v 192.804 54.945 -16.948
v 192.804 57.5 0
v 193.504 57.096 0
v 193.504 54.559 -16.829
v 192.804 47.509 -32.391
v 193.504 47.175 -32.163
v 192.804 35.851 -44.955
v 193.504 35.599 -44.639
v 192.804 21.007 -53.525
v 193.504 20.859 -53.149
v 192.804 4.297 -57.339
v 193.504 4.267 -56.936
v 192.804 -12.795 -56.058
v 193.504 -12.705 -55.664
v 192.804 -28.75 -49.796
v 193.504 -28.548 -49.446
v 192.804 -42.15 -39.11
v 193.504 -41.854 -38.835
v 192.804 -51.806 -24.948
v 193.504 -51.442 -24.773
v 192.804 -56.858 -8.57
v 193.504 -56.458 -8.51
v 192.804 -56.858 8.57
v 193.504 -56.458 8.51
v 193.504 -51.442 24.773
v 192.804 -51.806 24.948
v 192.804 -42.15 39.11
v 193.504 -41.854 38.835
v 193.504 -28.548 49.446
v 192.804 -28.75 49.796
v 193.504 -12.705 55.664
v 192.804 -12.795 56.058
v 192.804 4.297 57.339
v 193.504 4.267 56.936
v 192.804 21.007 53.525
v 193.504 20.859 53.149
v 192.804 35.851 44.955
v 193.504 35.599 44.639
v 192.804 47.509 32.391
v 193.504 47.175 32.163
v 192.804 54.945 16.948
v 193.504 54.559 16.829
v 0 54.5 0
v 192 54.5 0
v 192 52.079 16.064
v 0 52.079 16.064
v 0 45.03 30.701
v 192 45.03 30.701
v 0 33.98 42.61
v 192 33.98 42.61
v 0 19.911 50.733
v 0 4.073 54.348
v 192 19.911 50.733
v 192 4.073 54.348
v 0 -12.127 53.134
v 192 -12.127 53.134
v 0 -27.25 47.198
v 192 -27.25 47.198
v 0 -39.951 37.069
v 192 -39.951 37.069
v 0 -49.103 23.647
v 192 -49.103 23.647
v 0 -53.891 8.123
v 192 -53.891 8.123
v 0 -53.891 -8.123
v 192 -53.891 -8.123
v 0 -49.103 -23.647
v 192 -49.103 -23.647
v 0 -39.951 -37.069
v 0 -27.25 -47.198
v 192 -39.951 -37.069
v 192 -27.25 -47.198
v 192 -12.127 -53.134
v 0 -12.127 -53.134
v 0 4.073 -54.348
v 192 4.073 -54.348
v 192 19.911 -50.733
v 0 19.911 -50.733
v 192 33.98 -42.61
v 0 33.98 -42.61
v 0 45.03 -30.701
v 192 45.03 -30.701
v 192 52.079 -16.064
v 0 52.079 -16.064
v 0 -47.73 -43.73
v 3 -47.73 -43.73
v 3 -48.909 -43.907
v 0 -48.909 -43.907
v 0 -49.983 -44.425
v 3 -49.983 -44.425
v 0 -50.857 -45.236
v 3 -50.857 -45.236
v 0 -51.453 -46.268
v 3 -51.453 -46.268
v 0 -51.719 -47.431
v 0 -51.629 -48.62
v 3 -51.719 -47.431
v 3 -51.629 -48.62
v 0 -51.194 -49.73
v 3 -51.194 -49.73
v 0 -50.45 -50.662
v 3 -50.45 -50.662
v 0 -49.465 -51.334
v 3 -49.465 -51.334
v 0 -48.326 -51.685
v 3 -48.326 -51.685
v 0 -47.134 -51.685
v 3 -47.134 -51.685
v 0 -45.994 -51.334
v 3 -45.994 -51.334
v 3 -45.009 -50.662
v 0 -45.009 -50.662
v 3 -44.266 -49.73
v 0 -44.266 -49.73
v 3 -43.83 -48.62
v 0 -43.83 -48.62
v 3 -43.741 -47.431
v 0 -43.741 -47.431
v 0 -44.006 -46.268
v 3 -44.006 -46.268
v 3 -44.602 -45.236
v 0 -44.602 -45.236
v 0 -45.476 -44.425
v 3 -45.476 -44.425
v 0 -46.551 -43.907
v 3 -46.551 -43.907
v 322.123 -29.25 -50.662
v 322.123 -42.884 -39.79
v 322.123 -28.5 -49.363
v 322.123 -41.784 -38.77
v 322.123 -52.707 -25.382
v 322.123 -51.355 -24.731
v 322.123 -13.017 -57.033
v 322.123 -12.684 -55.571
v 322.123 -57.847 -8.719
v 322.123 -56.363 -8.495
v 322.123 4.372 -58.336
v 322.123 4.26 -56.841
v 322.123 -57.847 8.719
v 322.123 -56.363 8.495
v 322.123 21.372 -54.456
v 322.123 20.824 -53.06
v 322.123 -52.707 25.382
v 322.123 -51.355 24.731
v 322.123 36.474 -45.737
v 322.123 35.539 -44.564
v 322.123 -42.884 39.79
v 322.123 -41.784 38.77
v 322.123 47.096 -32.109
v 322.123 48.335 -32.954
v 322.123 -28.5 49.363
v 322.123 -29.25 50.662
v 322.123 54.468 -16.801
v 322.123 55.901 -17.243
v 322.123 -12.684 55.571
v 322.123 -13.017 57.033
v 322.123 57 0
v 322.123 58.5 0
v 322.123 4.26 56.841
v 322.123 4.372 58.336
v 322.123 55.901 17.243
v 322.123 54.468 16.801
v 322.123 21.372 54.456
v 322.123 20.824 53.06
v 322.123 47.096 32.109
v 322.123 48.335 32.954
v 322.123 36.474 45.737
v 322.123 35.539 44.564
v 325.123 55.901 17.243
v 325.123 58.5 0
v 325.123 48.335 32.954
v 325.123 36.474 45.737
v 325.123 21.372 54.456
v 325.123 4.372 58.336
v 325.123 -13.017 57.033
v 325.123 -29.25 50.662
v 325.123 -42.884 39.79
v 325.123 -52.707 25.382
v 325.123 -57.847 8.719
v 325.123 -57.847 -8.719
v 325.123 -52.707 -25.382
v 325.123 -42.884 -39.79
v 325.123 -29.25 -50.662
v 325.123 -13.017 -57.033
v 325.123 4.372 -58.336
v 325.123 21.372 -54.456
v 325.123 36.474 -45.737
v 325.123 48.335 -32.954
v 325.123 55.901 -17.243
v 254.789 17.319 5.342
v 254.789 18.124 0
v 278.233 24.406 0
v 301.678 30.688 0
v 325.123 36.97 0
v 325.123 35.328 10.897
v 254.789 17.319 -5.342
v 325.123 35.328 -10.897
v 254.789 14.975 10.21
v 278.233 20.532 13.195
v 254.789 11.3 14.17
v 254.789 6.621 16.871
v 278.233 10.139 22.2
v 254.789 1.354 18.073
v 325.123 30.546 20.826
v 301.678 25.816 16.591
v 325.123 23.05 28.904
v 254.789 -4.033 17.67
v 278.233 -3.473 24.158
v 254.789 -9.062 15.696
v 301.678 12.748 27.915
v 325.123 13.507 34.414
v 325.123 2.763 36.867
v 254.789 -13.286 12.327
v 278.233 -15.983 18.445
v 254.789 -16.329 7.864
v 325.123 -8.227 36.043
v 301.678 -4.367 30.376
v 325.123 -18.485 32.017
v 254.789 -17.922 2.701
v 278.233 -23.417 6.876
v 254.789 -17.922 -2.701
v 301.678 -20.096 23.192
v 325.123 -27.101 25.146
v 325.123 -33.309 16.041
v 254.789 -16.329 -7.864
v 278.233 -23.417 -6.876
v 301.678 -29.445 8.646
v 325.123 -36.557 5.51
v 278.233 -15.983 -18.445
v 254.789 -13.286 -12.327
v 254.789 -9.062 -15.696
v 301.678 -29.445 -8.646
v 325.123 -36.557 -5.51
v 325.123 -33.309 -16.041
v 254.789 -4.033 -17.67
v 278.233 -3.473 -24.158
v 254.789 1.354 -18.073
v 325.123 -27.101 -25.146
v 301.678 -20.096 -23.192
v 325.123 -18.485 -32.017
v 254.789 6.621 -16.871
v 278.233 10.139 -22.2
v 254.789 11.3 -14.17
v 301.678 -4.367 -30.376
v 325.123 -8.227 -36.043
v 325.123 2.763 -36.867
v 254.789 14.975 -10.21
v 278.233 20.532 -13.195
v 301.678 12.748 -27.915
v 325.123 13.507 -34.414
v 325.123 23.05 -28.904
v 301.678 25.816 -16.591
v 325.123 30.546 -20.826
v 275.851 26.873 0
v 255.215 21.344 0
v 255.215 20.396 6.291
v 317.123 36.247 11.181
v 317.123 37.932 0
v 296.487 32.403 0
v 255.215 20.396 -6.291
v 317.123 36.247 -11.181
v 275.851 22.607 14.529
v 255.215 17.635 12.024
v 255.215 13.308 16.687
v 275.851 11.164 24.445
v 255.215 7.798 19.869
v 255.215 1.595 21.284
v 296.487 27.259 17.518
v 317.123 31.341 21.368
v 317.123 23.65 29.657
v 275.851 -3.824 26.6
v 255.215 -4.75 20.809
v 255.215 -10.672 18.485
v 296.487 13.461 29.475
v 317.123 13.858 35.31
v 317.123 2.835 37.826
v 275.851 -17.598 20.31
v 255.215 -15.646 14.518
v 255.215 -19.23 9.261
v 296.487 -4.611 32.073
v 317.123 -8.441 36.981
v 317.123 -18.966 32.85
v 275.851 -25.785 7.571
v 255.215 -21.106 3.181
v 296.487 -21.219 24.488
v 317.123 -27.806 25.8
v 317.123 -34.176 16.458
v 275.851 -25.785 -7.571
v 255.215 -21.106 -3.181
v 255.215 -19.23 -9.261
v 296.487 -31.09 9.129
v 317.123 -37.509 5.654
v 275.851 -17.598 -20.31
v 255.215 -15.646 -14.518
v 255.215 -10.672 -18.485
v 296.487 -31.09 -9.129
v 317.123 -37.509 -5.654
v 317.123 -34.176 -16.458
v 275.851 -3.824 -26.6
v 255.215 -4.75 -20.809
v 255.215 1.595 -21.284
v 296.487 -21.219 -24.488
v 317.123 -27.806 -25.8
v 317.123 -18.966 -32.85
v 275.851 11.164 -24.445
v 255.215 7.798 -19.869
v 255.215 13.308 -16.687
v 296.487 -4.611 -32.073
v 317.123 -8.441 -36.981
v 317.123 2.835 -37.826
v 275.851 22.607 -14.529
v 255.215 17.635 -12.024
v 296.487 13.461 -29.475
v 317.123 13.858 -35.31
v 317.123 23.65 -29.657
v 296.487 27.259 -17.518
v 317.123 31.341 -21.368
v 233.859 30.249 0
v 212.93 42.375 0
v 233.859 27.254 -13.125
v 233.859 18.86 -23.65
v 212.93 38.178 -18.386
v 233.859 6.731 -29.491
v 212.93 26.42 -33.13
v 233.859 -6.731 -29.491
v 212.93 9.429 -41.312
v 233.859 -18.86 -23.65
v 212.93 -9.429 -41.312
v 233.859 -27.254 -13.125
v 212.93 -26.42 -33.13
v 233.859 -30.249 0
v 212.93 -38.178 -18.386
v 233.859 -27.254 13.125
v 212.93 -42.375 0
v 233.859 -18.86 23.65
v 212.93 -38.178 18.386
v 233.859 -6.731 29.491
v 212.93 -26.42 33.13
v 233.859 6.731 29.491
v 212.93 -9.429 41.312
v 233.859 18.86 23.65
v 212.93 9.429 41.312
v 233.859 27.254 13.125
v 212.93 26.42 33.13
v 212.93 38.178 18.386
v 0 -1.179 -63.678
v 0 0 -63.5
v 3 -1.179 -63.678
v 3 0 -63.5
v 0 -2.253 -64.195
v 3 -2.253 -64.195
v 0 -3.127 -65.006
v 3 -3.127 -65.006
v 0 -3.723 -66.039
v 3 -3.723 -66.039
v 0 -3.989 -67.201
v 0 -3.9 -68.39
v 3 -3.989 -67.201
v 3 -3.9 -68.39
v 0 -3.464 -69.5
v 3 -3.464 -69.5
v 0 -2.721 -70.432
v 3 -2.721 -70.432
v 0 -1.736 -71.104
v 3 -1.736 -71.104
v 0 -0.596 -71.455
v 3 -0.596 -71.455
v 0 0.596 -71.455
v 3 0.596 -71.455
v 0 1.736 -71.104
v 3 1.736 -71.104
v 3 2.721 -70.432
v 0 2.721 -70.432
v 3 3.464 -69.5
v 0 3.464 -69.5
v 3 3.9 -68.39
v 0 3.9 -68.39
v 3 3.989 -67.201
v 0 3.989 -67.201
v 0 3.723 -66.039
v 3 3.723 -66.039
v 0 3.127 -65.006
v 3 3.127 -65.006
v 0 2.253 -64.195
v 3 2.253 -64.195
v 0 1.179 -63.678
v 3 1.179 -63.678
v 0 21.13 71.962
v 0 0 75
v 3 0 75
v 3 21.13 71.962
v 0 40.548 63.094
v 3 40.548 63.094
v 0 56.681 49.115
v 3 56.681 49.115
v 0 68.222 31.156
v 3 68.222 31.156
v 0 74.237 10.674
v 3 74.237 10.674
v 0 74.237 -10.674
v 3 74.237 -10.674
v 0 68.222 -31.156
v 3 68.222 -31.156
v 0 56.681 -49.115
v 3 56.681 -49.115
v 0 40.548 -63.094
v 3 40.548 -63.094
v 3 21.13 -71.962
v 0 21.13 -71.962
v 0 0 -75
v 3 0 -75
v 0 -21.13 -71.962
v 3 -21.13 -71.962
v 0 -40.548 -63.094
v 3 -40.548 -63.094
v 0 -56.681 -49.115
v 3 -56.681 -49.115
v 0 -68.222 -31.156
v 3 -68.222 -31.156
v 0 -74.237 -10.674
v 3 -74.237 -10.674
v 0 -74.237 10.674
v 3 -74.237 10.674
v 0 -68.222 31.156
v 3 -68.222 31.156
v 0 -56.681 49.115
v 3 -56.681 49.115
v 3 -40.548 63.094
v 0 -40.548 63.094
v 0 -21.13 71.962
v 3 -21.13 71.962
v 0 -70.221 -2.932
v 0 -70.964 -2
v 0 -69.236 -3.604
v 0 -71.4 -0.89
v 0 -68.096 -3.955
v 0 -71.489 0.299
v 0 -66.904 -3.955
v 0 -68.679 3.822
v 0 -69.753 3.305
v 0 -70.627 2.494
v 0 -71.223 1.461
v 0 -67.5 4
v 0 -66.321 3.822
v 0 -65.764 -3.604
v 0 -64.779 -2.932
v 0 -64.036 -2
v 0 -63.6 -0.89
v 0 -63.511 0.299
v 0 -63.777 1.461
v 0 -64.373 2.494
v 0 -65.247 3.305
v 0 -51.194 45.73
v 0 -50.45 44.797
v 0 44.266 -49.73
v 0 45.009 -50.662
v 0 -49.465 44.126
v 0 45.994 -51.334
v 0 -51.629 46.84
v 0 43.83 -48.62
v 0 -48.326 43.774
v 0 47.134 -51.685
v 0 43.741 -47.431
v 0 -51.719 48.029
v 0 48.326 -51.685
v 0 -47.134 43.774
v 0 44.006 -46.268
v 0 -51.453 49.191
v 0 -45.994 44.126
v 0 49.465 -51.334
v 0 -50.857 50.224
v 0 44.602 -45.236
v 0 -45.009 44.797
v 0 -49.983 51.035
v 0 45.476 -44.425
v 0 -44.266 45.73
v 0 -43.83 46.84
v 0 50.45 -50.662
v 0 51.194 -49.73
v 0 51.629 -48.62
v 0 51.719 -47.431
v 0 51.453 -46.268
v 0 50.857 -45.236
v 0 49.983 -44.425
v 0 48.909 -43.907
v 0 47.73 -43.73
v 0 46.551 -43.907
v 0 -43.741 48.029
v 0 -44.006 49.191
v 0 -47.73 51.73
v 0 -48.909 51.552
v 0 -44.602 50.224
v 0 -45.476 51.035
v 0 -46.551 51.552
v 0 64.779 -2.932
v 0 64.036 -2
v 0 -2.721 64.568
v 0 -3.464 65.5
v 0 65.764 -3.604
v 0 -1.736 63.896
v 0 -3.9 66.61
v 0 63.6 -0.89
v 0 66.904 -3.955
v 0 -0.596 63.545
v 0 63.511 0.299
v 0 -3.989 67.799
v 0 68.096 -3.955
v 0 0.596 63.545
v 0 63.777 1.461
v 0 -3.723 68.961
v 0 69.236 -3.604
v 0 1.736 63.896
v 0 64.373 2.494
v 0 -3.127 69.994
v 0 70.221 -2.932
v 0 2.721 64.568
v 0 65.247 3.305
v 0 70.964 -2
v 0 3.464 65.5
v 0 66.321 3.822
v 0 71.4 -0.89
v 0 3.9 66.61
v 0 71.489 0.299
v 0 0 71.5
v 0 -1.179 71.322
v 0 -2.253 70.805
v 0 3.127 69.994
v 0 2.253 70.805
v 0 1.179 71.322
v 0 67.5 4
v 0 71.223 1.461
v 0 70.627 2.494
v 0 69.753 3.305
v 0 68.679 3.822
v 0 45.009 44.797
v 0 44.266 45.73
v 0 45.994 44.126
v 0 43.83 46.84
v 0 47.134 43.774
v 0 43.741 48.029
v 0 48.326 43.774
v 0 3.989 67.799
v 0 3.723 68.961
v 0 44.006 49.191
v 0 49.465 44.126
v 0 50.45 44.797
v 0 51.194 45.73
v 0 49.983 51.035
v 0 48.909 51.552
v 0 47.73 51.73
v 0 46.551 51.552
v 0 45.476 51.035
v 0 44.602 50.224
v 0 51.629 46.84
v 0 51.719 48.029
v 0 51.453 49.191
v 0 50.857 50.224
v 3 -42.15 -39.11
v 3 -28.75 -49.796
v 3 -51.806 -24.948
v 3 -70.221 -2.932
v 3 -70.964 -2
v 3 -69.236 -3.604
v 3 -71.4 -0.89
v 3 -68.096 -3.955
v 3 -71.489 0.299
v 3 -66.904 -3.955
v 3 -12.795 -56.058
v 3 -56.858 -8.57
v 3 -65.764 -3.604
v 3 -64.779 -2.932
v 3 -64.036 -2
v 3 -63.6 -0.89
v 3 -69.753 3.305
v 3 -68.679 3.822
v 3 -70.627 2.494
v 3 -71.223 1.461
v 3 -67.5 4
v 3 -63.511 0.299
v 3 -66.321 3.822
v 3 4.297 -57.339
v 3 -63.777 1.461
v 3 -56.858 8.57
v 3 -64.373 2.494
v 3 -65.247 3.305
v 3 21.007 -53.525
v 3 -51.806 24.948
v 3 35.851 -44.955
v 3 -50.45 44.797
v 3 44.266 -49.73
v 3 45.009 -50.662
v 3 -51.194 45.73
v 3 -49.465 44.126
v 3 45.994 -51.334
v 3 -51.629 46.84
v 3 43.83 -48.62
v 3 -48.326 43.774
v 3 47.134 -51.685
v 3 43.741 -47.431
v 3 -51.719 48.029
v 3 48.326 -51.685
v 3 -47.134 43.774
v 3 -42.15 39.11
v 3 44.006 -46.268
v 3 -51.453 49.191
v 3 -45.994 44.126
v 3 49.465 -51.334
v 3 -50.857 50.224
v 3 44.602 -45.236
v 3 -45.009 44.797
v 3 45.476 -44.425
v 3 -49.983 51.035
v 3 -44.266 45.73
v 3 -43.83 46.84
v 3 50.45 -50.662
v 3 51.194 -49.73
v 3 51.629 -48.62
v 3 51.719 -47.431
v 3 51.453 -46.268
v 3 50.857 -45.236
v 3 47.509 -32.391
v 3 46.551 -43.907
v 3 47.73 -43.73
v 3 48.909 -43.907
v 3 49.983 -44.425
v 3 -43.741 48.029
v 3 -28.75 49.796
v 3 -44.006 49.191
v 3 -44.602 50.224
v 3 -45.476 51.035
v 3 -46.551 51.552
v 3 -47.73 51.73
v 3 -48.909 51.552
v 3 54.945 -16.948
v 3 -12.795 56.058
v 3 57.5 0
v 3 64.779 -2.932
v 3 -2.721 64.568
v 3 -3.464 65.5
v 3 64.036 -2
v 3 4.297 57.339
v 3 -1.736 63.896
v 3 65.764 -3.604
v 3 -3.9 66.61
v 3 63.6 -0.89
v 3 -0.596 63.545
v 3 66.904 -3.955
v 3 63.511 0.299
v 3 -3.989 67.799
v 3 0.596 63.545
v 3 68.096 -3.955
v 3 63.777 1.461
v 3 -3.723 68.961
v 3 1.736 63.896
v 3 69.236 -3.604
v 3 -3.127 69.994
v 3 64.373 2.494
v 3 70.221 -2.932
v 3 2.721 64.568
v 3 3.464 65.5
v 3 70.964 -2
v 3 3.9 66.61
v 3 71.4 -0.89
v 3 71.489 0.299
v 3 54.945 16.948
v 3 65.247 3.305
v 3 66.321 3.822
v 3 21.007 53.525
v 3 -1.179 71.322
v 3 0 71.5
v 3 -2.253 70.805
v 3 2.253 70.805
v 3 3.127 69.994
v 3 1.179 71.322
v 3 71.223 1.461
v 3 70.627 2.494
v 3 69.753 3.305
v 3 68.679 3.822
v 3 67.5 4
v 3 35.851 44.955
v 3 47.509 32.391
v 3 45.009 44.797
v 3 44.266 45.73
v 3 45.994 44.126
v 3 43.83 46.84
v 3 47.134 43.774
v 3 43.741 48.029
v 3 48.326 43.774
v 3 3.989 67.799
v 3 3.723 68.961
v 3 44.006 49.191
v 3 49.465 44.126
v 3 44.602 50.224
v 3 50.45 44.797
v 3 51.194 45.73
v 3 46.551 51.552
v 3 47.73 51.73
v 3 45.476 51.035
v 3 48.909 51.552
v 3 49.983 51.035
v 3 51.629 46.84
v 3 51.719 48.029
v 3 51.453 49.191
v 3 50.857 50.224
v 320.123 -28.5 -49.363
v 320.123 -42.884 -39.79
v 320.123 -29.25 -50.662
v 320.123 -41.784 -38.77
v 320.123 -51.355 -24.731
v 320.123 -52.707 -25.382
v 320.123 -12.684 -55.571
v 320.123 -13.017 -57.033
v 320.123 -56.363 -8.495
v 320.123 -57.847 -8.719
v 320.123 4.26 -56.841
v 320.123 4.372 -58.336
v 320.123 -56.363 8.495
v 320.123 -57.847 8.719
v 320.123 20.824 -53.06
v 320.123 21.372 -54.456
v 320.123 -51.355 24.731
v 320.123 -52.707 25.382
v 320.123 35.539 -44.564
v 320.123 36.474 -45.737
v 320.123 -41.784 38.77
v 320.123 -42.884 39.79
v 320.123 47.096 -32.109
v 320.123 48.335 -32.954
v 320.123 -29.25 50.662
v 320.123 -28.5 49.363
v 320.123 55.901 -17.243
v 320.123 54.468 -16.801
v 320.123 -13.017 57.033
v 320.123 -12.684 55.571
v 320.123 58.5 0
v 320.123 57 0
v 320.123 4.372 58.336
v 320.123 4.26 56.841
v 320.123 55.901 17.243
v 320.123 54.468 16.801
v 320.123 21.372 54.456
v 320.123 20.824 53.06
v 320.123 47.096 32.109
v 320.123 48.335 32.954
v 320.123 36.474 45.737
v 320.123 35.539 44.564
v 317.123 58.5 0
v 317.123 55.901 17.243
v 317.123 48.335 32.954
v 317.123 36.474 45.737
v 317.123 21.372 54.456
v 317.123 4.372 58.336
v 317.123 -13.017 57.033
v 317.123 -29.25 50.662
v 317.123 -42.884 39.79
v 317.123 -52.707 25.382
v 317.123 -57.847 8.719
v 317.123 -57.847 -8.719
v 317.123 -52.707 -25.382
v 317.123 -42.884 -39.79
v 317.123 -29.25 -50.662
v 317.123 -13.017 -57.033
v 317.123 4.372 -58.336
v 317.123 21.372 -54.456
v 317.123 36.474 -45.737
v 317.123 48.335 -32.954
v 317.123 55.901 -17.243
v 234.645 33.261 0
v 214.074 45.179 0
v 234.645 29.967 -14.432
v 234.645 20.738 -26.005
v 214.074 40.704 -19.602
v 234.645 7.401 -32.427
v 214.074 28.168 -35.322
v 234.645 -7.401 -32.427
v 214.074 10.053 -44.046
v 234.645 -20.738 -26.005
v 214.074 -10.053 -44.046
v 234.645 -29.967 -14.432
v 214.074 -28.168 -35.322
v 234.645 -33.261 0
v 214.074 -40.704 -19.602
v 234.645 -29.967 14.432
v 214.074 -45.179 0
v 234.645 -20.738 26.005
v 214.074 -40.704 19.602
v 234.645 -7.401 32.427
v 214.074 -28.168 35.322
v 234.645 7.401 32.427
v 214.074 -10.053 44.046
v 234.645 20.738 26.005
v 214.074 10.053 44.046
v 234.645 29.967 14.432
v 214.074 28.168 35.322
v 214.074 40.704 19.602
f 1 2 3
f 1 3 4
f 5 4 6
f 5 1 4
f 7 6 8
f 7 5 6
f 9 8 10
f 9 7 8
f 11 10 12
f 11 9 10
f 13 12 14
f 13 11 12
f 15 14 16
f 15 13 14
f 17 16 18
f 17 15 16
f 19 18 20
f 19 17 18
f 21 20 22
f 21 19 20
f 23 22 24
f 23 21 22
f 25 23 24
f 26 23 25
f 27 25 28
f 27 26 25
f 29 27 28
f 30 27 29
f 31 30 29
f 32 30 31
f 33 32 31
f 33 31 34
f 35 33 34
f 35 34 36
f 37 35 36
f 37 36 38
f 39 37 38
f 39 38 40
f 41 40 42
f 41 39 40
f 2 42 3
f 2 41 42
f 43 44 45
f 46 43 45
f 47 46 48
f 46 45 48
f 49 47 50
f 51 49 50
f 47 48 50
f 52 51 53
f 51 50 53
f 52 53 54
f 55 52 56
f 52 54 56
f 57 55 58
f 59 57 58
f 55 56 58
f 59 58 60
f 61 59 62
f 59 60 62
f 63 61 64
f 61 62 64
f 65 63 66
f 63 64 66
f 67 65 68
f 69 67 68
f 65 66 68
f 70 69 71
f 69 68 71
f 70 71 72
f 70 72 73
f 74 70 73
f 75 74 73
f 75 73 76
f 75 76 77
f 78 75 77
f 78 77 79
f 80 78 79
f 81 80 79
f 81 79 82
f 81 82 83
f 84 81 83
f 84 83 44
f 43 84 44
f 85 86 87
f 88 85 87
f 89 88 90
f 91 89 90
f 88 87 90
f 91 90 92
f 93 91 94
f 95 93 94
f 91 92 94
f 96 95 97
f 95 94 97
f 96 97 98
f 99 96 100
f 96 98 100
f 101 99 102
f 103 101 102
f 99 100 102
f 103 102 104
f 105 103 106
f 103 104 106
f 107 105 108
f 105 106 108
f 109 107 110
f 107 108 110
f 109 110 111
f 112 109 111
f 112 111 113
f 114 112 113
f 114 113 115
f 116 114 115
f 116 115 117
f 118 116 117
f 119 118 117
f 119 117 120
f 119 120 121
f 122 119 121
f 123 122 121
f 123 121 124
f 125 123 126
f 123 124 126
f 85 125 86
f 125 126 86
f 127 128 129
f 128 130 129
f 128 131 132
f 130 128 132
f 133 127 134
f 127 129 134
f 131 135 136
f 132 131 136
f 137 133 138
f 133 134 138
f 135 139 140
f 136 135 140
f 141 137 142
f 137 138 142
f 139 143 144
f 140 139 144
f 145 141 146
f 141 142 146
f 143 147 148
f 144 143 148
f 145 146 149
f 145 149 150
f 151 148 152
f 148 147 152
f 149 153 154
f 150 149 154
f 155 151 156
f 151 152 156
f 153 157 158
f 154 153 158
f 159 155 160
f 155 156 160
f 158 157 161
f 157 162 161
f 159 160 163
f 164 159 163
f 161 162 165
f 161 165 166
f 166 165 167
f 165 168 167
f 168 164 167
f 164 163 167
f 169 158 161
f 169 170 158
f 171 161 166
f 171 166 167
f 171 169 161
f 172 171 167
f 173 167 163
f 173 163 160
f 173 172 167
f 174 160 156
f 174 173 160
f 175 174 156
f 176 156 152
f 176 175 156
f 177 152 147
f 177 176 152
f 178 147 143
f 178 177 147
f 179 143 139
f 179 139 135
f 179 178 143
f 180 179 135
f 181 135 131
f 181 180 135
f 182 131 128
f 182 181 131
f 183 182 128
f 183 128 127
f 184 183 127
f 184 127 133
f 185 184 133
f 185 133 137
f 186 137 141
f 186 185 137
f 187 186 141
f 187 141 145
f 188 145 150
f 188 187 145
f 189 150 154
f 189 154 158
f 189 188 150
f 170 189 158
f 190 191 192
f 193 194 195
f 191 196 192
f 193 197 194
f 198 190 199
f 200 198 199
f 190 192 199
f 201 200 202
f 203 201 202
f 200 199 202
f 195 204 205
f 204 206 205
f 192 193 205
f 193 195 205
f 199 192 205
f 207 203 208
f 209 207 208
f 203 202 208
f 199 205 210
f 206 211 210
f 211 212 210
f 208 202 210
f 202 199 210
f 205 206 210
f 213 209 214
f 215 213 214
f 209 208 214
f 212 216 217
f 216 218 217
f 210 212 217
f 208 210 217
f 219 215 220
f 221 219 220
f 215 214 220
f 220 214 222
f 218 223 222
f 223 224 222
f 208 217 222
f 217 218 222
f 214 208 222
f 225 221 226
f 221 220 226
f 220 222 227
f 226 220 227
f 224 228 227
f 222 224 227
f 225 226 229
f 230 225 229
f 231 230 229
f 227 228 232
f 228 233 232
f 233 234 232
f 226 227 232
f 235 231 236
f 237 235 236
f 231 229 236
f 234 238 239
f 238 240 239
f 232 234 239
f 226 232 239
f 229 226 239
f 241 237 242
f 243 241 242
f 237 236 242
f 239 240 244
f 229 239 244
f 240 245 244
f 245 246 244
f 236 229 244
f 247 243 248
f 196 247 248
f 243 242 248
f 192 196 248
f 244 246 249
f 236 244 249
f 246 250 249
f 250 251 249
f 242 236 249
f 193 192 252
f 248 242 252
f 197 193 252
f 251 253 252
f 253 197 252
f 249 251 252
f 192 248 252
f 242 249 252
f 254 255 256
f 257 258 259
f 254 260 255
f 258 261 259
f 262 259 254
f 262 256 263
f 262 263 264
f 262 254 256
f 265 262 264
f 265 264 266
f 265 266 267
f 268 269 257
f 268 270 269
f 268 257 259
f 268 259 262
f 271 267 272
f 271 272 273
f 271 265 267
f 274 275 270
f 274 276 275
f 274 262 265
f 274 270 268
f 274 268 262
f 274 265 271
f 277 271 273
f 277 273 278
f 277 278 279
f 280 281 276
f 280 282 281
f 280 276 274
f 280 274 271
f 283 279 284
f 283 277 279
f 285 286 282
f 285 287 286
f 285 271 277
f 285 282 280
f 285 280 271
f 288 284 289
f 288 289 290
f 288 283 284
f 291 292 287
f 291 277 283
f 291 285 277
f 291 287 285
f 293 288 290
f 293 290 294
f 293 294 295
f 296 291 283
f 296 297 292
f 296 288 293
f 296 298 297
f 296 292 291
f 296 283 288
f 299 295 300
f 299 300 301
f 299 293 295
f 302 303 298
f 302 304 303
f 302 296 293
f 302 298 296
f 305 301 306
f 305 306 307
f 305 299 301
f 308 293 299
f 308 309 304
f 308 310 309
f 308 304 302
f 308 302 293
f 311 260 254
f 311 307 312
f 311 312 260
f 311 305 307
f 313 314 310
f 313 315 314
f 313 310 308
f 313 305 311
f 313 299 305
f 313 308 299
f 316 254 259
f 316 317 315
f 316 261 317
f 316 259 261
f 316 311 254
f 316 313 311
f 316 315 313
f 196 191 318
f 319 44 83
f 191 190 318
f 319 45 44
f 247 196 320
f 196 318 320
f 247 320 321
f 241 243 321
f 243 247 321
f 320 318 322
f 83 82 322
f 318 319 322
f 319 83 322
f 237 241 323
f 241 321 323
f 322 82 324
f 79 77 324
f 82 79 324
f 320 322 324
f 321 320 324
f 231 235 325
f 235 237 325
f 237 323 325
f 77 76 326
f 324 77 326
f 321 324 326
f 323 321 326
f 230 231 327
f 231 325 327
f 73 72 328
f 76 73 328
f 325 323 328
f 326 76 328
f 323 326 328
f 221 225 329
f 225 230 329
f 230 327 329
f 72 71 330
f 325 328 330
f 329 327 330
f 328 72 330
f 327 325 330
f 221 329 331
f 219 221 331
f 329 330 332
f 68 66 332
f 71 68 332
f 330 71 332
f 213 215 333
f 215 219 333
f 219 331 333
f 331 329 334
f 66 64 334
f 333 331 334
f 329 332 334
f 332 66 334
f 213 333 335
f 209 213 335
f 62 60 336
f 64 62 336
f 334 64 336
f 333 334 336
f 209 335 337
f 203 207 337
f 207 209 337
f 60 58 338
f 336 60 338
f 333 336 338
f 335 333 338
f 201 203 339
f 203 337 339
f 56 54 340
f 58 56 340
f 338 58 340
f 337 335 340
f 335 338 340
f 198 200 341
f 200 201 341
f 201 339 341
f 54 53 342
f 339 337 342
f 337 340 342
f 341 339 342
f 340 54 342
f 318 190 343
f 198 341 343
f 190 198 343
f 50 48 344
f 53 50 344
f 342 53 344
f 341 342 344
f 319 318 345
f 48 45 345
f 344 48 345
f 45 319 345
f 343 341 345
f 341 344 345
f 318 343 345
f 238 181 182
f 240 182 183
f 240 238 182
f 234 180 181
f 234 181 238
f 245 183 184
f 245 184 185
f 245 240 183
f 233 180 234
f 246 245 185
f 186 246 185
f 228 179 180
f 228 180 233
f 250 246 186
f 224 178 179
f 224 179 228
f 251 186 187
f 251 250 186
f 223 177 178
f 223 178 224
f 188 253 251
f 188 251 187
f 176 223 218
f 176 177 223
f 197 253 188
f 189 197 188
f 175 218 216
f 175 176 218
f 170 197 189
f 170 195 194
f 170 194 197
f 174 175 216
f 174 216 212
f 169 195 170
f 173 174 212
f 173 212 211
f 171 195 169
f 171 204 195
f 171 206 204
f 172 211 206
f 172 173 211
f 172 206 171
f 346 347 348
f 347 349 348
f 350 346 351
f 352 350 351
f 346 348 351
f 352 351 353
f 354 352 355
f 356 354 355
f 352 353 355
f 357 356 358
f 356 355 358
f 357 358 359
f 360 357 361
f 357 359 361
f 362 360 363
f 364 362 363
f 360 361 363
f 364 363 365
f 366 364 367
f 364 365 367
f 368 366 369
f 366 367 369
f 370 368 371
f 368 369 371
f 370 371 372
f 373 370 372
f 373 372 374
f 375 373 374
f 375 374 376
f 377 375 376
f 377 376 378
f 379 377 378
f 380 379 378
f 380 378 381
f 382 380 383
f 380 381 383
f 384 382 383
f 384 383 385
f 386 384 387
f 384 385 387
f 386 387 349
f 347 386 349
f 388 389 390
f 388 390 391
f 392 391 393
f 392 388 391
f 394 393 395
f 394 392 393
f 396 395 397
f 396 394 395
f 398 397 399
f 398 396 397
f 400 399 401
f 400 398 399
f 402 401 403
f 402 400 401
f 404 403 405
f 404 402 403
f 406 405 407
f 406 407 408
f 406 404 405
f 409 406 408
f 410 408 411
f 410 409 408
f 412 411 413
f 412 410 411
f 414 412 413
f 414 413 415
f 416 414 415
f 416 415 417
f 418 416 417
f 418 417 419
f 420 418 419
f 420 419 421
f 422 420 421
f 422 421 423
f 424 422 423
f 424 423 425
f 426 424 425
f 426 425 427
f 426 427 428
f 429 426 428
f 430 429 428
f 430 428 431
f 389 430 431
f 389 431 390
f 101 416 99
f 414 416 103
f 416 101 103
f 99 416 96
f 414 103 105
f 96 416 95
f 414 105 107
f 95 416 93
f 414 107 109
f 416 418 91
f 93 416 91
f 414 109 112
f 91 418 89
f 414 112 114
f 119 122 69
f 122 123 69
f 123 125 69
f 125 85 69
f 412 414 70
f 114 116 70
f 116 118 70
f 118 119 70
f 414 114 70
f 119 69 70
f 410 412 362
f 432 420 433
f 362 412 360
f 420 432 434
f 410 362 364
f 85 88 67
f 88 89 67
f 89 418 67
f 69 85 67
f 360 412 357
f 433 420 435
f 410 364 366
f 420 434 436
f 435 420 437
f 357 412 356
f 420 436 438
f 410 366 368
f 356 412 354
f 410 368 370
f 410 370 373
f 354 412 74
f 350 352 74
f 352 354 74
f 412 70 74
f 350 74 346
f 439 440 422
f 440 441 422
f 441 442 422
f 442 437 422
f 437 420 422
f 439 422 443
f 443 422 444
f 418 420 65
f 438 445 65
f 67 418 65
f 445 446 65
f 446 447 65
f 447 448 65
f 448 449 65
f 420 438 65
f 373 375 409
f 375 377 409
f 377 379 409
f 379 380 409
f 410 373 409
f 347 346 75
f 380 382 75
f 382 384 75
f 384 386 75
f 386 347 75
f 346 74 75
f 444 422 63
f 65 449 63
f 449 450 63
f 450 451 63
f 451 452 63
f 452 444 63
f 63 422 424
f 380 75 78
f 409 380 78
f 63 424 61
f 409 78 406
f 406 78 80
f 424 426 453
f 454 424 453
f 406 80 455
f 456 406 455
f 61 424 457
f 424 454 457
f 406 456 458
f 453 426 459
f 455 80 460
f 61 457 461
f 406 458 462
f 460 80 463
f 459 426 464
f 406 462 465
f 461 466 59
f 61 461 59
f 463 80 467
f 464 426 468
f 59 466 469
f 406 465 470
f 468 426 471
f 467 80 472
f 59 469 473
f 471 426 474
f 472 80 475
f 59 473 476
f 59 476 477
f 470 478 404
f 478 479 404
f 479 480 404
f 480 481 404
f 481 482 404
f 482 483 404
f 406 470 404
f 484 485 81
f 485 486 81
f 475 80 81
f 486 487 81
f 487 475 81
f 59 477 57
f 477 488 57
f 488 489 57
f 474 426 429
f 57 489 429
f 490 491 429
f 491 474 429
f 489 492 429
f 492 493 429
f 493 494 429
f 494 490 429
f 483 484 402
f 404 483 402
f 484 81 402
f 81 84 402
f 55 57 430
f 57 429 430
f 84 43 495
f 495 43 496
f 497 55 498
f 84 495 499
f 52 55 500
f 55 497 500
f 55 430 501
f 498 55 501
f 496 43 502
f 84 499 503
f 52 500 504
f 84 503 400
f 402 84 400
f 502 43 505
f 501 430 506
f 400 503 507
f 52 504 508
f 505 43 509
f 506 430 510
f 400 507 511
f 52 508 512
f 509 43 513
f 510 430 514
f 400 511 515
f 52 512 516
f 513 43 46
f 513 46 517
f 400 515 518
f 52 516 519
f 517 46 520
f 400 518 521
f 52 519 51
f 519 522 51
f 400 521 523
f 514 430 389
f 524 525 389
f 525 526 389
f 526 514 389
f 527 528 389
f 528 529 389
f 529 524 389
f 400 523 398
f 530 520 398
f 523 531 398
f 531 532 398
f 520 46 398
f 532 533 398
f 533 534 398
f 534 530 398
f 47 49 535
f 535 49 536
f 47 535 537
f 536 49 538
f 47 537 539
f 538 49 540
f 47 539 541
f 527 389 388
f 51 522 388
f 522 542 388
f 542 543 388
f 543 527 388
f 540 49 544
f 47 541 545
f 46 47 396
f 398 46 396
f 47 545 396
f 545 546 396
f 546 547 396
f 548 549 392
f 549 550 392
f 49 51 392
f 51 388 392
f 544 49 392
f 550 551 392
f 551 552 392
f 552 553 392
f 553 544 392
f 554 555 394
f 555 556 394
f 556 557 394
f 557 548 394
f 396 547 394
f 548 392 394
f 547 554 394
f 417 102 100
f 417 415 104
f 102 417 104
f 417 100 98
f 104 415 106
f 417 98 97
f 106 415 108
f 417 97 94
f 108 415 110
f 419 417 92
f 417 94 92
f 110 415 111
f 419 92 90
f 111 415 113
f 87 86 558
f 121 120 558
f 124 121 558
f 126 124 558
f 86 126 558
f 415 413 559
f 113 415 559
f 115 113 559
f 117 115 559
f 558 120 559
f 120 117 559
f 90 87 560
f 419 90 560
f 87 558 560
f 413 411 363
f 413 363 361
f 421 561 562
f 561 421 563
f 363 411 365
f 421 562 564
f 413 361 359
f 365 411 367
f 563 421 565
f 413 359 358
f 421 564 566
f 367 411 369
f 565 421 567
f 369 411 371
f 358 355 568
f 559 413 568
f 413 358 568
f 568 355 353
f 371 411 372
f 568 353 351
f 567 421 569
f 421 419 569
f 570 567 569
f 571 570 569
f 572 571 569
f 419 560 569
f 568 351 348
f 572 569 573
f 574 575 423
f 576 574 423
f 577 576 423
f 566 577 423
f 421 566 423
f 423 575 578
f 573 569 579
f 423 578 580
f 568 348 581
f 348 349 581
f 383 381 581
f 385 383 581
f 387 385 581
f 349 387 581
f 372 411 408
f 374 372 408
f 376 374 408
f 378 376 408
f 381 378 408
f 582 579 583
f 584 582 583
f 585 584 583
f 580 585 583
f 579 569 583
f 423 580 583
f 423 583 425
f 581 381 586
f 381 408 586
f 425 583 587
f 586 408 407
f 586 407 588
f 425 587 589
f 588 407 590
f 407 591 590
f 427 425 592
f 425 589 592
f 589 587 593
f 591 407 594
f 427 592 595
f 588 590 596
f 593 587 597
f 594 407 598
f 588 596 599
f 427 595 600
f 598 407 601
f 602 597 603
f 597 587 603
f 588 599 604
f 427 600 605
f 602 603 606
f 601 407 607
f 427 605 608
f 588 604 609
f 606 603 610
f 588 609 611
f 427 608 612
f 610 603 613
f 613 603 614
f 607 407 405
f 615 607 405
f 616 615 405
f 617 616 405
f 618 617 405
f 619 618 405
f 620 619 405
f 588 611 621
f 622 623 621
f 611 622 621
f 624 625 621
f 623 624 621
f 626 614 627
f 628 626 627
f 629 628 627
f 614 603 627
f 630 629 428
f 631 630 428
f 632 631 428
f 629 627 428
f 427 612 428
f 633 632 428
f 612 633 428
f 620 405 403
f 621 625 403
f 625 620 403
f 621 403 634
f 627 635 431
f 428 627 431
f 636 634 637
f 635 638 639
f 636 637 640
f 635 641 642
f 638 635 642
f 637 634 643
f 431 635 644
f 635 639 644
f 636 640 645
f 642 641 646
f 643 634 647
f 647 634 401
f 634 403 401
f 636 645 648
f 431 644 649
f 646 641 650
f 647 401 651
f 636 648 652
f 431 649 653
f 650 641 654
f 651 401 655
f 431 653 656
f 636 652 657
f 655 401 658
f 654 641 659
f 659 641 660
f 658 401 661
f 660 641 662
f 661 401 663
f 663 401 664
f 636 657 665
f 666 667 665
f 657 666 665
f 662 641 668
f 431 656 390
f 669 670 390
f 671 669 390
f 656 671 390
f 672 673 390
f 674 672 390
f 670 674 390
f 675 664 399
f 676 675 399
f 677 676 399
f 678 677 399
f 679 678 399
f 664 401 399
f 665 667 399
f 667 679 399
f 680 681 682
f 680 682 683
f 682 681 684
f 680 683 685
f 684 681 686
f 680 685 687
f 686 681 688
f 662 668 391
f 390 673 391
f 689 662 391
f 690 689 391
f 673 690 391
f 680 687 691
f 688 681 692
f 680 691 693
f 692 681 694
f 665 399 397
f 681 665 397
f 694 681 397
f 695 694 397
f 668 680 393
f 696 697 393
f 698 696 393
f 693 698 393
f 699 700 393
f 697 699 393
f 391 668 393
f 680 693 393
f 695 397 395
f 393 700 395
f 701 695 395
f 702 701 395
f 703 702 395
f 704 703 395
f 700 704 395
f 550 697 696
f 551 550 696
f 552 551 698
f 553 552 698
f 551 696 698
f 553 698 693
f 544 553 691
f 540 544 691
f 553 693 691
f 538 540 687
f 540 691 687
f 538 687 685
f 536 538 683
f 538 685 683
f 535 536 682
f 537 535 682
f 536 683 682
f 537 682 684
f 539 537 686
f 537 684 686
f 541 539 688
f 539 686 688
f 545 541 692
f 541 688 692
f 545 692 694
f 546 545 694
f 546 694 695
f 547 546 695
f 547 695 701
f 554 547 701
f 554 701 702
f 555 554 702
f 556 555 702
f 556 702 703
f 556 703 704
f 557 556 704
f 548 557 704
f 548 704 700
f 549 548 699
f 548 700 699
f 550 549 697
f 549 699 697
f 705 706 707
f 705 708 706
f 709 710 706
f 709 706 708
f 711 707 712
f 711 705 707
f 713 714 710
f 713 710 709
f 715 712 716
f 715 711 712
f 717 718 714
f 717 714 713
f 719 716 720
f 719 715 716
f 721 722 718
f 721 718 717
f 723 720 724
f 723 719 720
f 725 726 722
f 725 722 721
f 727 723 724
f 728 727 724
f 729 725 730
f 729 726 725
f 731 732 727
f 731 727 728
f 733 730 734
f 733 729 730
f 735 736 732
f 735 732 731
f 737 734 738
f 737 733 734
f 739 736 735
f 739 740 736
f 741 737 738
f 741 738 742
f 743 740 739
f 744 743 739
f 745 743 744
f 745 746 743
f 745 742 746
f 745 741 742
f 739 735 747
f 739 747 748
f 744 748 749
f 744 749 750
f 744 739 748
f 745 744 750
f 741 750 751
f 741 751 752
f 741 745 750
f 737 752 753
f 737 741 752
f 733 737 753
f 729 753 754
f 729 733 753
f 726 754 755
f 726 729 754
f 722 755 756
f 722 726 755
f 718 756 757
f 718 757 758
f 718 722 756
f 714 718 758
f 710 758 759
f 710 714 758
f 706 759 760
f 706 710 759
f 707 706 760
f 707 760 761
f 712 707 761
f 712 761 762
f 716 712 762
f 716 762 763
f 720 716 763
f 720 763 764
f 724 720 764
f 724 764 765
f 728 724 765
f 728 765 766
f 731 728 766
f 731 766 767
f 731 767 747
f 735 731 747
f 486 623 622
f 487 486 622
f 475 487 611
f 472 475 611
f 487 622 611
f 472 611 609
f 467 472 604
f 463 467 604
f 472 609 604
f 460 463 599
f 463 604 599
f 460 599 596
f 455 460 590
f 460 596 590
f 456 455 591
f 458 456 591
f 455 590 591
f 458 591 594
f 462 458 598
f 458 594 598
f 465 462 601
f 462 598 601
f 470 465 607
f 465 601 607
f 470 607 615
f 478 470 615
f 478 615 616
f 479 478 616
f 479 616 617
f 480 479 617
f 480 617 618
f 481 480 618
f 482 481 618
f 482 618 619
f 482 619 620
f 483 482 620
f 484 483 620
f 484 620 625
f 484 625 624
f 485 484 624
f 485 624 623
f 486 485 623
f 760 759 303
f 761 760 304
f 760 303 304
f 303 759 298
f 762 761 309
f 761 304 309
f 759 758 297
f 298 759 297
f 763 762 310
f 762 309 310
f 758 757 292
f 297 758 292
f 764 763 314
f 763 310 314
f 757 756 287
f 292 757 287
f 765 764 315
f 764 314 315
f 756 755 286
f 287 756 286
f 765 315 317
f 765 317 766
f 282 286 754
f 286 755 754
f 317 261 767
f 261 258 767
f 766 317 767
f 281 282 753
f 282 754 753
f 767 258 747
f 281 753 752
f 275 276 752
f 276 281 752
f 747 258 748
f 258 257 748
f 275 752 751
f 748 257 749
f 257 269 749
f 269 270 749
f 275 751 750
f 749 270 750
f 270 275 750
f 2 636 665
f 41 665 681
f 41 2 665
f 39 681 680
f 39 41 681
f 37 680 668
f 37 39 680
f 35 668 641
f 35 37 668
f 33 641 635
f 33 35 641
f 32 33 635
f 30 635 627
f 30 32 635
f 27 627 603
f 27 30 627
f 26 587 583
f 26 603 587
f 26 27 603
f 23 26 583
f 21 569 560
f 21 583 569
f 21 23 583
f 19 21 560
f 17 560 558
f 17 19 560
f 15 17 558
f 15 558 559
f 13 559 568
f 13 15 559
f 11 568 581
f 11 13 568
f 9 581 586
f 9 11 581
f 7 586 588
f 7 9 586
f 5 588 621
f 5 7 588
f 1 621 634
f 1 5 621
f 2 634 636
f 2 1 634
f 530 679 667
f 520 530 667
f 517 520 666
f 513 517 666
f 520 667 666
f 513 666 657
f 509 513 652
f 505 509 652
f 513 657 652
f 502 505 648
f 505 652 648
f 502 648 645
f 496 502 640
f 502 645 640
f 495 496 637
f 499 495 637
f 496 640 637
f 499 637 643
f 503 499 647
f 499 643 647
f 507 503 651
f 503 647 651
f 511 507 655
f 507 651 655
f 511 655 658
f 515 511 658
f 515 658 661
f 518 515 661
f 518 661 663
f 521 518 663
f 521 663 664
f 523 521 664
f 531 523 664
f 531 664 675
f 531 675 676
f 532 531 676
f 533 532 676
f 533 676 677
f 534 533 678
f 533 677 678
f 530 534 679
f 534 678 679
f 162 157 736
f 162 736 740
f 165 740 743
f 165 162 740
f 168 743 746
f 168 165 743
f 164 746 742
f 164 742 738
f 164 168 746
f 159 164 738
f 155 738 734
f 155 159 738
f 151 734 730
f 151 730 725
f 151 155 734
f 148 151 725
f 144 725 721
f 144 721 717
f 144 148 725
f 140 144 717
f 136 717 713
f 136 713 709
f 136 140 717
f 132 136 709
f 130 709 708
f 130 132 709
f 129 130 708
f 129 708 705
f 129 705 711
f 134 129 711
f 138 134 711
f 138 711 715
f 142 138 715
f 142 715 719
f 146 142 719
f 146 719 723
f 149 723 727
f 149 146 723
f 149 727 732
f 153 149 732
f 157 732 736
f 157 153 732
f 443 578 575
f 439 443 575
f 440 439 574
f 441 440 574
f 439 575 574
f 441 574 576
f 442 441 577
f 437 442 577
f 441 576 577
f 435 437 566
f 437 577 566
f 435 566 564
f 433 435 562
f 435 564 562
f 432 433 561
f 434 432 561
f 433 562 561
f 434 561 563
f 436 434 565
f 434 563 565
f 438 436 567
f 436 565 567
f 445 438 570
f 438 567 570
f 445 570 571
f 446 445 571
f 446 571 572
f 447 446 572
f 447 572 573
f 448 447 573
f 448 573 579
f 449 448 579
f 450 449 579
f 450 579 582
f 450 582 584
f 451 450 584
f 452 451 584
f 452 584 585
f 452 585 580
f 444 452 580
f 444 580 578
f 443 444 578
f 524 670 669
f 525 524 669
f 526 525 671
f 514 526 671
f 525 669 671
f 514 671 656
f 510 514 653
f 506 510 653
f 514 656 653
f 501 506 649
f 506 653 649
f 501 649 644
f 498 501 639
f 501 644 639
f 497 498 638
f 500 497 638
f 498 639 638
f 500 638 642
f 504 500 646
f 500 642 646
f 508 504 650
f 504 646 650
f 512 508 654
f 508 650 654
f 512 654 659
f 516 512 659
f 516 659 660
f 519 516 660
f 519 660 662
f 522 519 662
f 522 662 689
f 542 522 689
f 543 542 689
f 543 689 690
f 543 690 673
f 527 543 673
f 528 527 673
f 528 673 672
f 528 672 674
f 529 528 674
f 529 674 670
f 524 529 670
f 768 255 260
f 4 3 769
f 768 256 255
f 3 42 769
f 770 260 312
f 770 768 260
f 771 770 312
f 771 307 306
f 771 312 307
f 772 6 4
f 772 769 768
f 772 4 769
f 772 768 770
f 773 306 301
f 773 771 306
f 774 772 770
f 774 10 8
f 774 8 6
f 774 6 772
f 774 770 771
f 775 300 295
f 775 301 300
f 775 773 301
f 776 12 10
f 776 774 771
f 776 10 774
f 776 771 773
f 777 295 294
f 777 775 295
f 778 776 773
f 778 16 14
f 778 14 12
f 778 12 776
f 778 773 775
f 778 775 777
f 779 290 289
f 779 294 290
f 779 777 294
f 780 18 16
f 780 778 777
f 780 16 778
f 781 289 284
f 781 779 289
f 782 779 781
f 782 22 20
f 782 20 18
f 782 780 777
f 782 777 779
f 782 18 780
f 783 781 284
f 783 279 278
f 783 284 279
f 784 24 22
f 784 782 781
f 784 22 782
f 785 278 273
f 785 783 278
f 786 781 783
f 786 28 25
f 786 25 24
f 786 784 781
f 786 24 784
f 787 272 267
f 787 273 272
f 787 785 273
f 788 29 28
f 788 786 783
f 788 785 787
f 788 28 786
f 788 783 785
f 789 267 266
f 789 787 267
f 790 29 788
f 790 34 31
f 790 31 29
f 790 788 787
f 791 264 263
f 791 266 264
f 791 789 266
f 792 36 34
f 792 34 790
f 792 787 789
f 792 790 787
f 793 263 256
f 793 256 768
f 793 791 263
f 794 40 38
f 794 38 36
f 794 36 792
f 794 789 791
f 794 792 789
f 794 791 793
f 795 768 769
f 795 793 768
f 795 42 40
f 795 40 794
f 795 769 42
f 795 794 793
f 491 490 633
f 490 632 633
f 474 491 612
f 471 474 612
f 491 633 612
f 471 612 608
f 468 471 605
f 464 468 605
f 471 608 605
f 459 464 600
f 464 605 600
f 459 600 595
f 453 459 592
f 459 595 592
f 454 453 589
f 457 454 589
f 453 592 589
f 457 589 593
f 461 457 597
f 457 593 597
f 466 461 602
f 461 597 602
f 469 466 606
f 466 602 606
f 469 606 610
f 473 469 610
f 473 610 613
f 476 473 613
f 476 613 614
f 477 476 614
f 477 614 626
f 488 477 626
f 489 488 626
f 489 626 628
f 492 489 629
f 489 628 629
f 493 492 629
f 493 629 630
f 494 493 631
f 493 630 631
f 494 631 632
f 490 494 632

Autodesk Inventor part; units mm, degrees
ref_plane "YZ Plane" through (0, 0, 0) normal (1, 0, 0) x (0, 1, 0)
ref_plane "XZ Plane" through (0, 0, 0) normal (0, 1, 0) x (-1, 0, 0)
ref_plane "XY Plane" through (0, 0, 0) normal (0, 0, 1) x (1, 0, 0)
sketch "Sketch2" plane through (0, 0, 0) normal (0, 0, 1) x (1, 0, 0)
  line L0 (0, 54.5) -> (192, 54.5)
  line L1 (254.7886, 18.124) -> (254.7886, 0) construction
  line L2 (192, 54.5) -> (254.7886, 18.124)
  line L3 (254.7886, 18.124) -> (325.1228, 36.97)
  line L4 (254.7886, 18.124) -> (254.7886, 43.3259) construction
  line L5 (0, 0) -> (254.7886, 0)
  line L6 (325.1228, 36.97) -> (325.1228, 0)
  line L7 (192, 54.5) -> (254.7886, 18.124)
  line L8 (325.1228, 0) -> (305.1228, 0)
  line L9 (-65.0246, 0) -> (390.1474, 0) projected
  line L10 (0, 57.5) -> (192, 57.5)
  line L11 (193.5039, 57.0958) -> (255.2149, 21.3441)
  line L12 (255.2149, 21.3441) -> (325.1228, 40.0758)
  line L13 (325.1228, 36.97) -> (325.1228, 40.0758)
  line L14 (0, 54.5) -> (0, 57.5)
  line L15 (193.5039, 57.0958) -> (192.8038, 57.5)
  line L16 (193.5039, 57.0958) -> (200.0085, 57.0958) construction
  line L17 (192, 57.5) -> (192.8038, 57.5)
  line L18 (325.1228, 40.0758) -> (325.1228, 57.5)
  line L19 (317.1228, 57.5) -> (317.1228, 37.9322)
  line L20 (325.1228, 0) -> (325.1228, 58.5)
  line L21 (317.1228, 58.5) -> (317.1228, 57.5)
  line L22 (317.1228, 58.5) -> (325.1228, 58.5)
  point P0 (254.7886, 31.9804)
  point P1 (325.1228, 59.5)
  point P2 (321.1228, 58.5)
  dimension "d2" = 18.124
  dimension "d9" = 54.5
  dimension "d43" = 192
  dimension "d76" = 20
  dimension "d141" = 3
  dimension "d142" = 3
  dimension "d143" = 3
  dimension "d144" = 150
  dimension "d159" = 8
  dimension "d199" = 58.5
revolve "Revolution1" add sketch "Sketch2" angle 360 about axis through (0, 0, 0) along (1, 0, 0) contours L14 L10 L17 L15 L11 L12 L13 L3 L2 L0
sketch "Sketch24" plane through (0, 0, 0) normal (-1, 0, 0) x (0, 0, 1)
  circle A0 centre (0, 0) radius 75
  circle A1 centre (0, 0) radius 21.3441 projected
  circle A2 centre (0, 0) radius 57.5
  dimension "d155" = 150
  dimension "d156" = 115
extrude "Extrusion9" add sketch "Sketch24" against normal blind 3 contours A0
revolve "Revolution4" add sketch "Sketch2" angle 360 about axis through (-10, 0, 0) along (1, 0, 0) contours L12 L19 L21 L22 L20 L18
sketch "Sketch25" plane through (0, 0, 0) normal (0, 0, 1) x (1, 0, 0)
  line L0 (317.1228, -54.5) -> (317.1228, 54.5) projected
  line L1 (317.1228, 54.5) -> (320.1228, 54.5)
  line L2 (317.1228, 54.5) -> (325.1228, 54.5) projected
  line L3 (320.1228, 54.5) -> (320.1228, 53.5)
  line L4 (320.1228, 53.5) -> (322.1228, 53.5)
  line L5 (322.1228, 53.5) -> (322.1228, 54.5)
  line L6 (322.1228, 54.5) -> (320.7933, 54.5)
  line L7 (317.1228, -58.5) -> (317.1228, 58.5) projected
  line L8 (317.1228, 54.5) -> (317.1228, 58.5)
  line L9 (320.1189, 58.348) -> (320.0429, 56.8499)
  line L10 (317.1228, 58.5) -> (320.1228, 58.5)
  line L11 (317.1228, 58.5) -> (325.1228, 58.5) projected
  line L12 (320.1228, 58.5) -> (320.0506, 57.0017)
  point P0 (0, 0)
  dimension "d161" = 3
  dimension "d162" = 1
  dimension "d163" = 2
  dimension "d202" = 3
revolve "Revolution5" [suppressed]
sketch "Sketch26" plane through (0, 0, 0) normal (-1, 0, 0) x (0, 0, 1)
  circle A0 centre (0, 0) radius 18.124 projected
  circle A1 centre (0, 0) radius 67.5
  circle A2 centre (0, 67.5) radius 4
  circle A3 centre (-47.7297, 47.7297) radius 4
  circle A4 centre (-67.5, 0) radius 4
  circle A5 centre (-47.7297, -47.7297) radius 4
  circle A6 centre (0, -67.5) radius 4
  circle A7 centre (47.7297, -47.7297) radius 4
  circle A8 centre (67.5, 0) radius 4
  circle A9 centre (47.7297, 47.7297) radius 4
  point P0 (0, 0)
  dimension "d165" = 135
  dimension "d166" = 8
  dimension "d169" = 360
hole "Hole1" at (0, 67.5, 0) at (0, 47.7297, -47.7297) at (0, 0, -67.5) at (0, 47.7297, 47.7297) at (0, 0, 67.5) at (0, -47.7297, -47.7297) at (0, -67.5, 0) at (0, -47.7297, 47.7297) direction (1, 0, 0) diameter 8 end through all
thread "Thread19" size "M8x1.25" class "6H" standard "ANSI Metric M Profile" full length
thread "Thread20" size "M8x1.25" class "6H" standard "ANSI Metric M Profile" full length
thread "Thread21" size "M8x1.25" class "6H" standard "ANSI Metric M Profile" full length
thread "Thread22" size "M8x1.25" class "6H" standard "ANSI Metric M Profile" full length
thread "Thread23" size "M8x1.25" class "6H" standard "ANSI Metric M Profile" full length
thread "Thread24" size "M8x1.25" class "6H" standard "ANSI Metric M Profile" full length
thread "Thread25" size "M8x1.25" class "6H" standard "ANSI Metric M Profile" full length
thread "Thread26" size "M8x1.25" class "6H" standard "ANSI Metric M Profile" full length
thread "Thread27" size "M8x1.25" class "6H" standard "ANSI Metric M Profile" full length
sketch "Sketch27" plane through (0, 0, 0) normal (0, 0, 1) x (1, 0, 0)
  line L0 (317.1228, -58.5) -> (317.1228, 58.5) projected
  line L1 (317.1228, 58.5) -> (320.1228, 58.5)
  line L2 (317.1228, 58.5) -> (325.1228, 58.5) projected
  line L3 (320.1228, 58.5) -> (320.1228, 57)
  line L4 (320.1228, 57) -> (322.1228, 57)
  line L5 (322.1228, 57) -> (322.1228, 58.5)
  line L6 (-65.0246, 0) -> (390.1474, 0) projected
  point P0 (0, 0)
  dimension "d207" = 3
  dimension "d208" = 1.5
  dimension "d209" = 2
revolve "Revolution6" cut sketch "Sketch27" angle 360 about axis through (-10, 0, 0) along (1, 0, 0)
properties part number "aluminium engine" material "Aluminum 6061"
